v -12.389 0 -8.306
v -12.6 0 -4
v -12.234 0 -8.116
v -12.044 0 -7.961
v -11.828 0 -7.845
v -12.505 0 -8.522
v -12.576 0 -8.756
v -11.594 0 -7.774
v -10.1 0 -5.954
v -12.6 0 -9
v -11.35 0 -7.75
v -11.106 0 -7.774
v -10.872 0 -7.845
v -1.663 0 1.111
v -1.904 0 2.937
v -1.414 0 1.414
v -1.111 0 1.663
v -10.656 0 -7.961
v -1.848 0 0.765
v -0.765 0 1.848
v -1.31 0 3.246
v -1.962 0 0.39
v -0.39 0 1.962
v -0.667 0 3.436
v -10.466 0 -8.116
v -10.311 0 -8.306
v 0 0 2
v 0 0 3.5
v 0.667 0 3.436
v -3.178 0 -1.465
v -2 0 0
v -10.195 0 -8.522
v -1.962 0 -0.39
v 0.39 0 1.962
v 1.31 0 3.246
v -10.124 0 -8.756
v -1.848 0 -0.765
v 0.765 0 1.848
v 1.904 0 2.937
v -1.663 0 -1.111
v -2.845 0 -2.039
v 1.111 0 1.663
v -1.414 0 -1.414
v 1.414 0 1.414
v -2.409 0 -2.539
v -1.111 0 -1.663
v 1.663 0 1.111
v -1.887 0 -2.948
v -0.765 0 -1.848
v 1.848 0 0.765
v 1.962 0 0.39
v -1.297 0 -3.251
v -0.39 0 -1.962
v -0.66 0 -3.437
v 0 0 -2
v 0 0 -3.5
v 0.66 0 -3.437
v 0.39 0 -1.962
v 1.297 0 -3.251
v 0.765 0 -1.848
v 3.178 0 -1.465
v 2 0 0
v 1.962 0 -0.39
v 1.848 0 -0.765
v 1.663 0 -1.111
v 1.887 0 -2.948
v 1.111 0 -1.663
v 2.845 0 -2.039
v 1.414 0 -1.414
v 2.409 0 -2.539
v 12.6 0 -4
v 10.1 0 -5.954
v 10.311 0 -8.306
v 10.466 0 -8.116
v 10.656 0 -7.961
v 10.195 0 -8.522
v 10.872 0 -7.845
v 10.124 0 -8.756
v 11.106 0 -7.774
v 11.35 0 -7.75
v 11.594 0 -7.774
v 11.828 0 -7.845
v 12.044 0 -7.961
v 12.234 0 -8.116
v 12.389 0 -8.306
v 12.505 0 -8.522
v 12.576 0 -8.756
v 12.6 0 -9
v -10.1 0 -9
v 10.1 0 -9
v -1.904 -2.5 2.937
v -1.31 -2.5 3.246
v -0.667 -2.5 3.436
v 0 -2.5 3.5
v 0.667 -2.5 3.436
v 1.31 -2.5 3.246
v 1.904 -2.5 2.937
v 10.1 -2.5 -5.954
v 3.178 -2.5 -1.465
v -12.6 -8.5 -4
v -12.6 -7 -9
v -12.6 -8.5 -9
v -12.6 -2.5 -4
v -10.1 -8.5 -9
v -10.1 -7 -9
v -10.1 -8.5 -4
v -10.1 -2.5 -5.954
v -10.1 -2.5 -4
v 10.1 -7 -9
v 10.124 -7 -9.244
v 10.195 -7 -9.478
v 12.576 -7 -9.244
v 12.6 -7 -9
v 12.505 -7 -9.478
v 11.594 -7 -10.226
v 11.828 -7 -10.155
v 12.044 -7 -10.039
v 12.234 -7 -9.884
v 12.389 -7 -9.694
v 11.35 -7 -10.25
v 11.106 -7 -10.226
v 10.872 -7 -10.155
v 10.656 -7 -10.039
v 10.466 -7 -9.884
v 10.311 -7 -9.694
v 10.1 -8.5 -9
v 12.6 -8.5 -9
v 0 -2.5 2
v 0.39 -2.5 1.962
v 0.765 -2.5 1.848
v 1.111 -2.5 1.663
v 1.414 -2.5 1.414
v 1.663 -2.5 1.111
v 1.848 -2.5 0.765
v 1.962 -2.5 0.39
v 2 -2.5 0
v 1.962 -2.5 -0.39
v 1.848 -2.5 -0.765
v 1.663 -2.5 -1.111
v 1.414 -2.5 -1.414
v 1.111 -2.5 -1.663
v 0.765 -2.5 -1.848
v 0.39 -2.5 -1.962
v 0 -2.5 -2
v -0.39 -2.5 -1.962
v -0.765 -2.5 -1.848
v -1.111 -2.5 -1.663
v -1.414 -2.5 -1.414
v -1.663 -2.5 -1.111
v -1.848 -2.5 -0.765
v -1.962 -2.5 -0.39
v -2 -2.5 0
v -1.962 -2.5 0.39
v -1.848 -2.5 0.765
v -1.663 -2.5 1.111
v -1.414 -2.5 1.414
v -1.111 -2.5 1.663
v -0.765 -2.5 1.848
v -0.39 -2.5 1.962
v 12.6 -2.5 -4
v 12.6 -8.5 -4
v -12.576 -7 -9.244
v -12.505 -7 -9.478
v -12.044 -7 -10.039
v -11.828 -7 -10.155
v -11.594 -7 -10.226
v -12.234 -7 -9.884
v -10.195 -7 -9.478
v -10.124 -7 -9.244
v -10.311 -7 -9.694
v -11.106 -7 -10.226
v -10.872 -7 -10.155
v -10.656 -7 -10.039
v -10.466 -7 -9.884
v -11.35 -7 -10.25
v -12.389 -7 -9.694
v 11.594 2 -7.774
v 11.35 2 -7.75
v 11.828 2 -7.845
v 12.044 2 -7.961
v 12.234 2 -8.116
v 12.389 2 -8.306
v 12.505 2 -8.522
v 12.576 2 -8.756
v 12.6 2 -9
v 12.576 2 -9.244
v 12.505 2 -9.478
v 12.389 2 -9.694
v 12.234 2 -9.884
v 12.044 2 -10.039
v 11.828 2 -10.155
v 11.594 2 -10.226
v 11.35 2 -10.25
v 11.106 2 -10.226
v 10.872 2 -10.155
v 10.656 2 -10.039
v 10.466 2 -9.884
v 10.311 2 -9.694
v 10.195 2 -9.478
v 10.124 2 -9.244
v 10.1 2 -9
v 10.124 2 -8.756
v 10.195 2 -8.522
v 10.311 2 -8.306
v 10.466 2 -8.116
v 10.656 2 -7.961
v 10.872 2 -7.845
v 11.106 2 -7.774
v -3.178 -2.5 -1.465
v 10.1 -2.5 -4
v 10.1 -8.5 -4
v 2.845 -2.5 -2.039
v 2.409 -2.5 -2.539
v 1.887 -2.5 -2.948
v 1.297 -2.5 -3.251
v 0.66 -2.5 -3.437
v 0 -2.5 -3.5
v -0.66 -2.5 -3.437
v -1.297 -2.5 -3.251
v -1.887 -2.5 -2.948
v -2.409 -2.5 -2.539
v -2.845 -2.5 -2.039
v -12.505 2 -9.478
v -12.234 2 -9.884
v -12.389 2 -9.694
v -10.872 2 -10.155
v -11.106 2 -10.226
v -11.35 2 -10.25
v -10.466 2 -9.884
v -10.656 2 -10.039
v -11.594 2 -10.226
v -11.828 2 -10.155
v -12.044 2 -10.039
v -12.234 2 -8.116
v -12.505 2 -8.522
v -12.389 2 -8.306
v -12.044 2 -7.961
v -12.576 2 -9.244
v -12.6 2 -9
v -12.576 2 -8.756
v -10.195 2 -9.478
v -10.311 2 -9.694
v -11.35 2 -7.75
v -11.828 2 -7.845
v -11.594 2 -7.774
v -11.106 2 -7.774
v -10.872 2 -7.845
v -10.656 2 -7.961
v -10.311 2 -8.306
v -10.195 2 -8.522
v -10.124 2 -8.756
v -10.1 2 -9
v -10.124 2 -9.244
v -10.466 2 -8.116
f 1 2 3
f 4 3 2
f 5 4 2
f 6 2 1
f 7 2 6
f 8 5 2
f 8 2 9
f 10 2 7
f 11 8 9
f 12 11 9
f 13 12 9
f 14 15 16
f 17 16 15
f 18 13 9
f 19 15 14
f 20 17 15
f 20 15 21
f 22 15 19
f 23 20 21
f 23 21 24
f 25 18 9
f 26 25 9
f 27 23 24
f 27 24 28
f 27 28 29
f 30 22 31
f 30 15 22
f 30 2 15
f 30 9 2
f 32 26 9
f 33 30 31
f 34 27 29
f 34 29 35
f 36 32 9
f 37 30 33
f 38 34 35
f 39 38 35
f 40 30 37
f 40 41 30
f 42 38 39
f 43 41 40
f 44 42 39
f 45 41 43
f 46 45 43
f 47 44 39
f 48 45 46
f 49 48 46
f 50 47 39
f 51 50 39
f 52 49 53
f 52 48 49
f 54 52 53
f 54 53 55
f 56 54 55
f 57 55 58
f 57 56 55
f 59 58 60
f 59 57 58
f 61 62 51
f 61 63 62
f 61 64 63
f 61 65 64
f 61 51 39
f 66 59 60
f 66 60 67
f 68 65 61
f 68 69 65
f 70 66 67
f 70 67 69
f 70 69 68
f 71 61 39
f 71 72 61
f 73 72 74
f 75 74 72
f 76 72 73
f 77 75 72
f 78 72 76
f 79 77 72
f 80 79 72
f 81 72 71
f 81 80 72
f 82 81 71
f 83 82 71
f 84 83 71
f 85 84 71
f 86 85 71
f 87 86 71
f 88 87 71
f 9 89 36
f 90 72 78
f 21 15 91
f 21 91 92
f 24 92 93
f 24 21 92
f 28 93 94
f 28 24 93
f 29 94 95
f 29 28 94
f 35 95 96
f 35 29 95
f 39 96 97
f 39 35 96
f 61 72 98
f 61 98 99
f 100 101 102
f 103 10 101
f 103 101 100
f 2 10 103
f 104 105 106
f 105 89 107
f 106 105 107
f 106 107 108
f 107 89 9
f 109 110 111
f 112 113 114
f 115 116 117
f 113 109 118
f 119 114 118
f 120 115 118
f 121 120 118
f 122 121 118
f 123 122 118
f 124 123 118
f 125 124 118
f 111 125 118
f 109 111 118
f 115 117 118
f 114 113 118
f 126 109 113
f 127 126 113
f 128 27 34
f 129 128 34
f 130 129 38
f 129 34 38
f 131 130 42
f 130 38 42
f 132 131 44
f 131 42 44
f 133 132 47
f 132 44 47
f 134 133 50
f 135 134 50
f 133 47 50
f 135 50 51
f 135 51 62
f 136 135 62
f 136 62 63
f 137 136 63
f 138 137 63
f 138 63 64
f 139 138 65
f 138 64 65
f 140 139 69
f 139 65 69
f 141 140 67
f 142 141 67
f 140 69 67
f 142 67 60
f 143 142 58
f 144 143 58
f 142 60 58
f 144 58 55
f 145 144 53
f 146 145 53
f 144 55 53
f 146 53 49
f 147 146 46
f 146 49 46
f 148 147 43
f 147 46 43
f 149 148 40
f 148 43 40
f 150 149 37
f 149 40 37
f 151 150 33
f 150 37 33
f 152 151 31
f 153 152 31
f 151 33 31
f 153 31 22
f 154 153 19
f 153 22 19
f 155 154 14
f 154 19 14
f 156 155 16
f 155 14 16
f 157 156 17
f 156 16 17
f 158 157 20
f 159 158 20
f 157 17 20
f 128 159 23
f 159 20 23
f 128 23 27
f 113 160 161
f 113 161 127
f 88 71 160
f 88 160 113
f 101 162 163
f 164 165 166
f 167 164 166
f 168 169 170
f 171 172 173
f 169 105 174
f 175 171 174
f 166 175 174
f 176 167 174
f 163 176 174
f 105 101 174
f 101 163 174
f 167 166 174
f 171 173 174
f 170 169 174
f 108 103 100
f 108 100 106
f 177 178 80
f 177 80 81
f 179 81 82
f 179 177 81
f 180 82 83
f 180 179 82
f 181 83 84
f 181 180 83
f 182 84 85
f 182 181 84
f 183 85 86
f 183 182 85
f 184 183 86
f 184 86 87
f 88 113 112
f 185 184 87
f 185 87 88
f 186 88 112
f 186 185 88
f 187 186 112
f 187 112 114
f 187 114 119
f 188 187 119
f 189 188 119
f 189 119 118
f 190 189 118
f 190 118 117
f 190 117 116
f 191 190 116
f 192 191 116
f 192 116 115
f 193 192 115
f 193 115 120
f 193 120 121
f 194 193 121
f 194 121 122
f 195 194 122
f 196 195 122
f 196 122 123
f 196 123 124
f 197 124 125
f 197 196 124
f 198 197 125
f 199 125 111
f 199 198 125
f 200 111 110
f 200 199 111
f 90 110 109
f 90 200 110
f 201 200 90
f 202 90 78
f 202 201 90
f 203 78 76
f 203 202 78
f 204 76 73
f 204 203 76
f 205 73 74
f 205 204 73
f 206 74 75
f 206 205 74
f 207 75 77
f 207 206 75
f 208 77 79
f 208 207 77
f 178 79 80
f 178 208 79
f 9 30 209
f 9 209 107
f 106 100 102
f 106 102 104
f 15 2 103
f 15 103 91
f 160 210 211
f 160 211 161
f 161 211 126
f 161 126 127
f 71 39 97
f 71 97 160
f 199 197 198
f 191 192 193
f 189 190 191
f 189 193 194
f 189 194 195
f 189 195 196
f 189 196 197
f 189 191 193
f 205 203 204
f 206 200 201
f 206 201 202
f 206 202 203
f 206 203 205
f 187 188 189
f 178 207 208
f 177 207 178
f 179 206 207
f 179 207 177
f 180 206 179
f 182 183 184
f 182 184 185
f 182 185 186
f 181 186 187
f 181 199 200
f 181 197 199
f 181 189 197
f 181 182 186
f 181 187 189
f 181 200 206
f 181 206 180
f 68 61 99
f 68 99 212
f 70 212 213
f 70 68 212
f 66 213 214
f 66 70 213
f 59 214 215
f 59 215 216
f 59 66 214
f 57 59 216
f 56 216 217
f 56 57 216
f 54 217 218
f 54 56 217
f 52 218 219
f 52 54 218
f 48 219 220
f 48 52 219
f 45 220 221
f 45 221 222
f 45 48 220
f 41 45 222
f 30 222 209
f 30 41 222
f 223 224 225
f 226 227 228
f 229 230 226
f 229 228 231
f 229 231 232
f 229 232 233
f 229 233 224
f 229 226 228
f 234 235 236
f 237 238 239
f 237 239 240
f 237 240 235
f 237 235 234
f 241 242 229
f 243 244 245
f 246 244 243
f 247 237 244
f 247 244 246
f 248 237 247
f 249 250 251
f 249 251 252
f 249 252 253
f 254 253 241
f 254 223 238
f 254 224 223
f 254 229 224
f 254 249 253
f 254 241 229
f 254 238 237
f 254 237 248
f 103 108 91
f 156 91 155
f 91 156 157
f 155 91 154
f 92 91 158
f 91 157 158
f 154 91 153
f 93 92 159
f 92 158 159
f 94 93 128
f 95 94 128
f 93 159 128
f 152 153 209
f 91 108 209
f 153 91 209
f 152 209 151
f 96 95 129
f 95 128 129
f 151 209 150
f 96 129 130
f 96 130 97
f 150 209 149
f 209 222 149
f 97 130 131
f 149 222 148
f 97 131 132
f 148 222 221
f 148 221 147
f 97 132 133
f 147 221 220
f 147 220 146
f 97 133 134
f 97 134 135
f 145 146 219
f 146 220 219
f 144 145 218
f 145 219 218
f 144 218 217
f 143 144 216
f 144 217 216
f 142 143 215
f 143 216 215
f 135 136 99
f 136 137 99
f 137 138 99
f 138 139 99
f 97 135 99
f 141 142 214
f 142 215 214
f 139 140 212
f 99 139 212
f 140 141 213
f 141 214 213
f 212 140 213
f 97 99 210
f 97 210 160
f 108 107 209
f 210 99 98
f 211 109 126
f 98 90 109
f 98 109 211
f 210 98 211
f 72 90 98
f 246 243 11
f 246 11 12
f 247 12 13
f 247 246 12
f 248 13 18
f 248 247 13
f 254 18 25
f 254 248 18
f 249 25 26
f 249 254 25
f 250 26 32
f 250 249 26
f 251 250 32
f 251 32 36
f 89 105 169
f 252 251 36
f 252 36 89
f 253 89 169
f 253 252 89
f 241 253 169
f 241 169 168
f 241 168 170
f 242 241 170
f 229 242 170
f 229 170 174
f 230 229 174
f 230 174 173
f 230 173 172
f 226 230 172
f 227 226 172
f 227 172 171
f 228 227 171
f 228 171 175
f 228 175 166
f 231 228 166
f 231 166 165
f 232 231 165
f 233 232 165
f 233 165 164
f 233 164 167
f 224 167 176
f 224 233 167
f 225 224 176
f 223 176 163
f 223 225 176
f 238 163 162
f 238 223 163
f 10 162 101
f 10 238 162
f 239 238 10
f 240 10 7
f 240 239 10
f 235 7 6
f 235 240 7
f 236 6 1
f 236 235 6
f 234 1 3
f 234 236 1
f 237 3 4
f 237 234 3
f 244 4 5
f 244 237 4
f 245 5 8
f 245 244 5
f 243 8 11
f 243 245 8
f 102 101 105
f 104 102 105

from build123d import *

# Parameters (mm, degrees)
ESBO_O1_R                = 2
RESSALTO_EXTRUS_O1_DEPTH = 2.5
RESSALTO_EXTRUS_O2_DEPTH = 7
RESSALTO_EXTRUS_O3_START = 2
ESBO_O1_4_R              = 1.25
RESSALTO_EXTRUS_O3_DEPTH = 2
ESBO_O2_W                = 2.5
ESBO_O2_H                = 5
RESSALTO_EXTRUS_O4_DEPTH = 1.5


with BuildPart() as part:
    # Esboço1 → Ressalto-extrusão1 (new body)
    with BuildSketch(Plane(origin=(0, 0, 0), x_dir=(1, 0, 0), z_dir=(0, 1, 0))):
        with BuildLine():
            ThreePointArc((-10.1, 9), (-11.35, 10.25), (-12.6, 9))
            Line((-12.6, 9), (-12.6, 4))
            Line((-12.6, 4), (-1.904447094, -2.936508346))
            ThreePointArc((-1.904447094, -2.936508346), (0, -3.5), (1.904447094, -2.936508346))
            Line((1.904447094, -2.936508346), (12.6, 4))
            Line((12.6, 4), (12.6, 9))
            ThreePointArc((12.6, 9), (11.35, 10.25), (10.1, 9))
            Line((10.1, 9), (10.1, 5.954321796))
            Line((10.1, 5.954321796), (3.178453386, 1.465412595))
            ThreePointArc((3.178453386, 1.465412595), (0, 3.5), (-3.178453386, 1.465412595))
            Line((-3.178453386, 1.465412595), (-10.1, 5.954321796))
            Line((-10.1, 5.954321796), (-10.1, 9))
        make_face()
        Circle(ESBO_O1_R, mode=Mode.SUBTRACT)
    extrude(amount=-RESSALTO_EXTRUS_O1_DEPTH)

    # Esboço1<3> → Ressalto-extrusão2 (add)
    with BuildSketch(Plane(origin=(0, 0, 0), x_dir=(1, 0, 0), z_dir=(0, 1, 0))):
        with BuildLine():
            ThreePointArc((-10.1, 9), (-11.35, 10.25), (-12.6, 9))
            Line((-12.6, 9), (-12.6, 4))
            Line((-12.6, 4), (-10.1, 4))
            Line((-10.1, 4), (-10.1, 9))
        make_face()
        with BuildLine():
            Line((10.1, 9), (10.1, 4))
            Line((10.1, 4), (12.6, 4))
            Line((12.6, 4), (12.6, 9))
            ThreePointArc((12.6, 9), (11.35, 10.25), (10.1, 9))
        make_face()
    extrude(amount=-RESSALTO_EXTRUS_O2_DEPTH)

    # Esboço1<4> → Ressalto-extrusão3 (add)
    with BuildSketch(Plane(origin=(0, 0, 0), x_dir=(1, 0, 0), z_dir=(0, 1, 0)).offset(RESSALTO_EXTRUS_O3_START)):
        with Locations((-11.35, 9)):
            Circle(ESBO_O1_4_R)
        with Locations((11.35, 9)):
            Circle(ESBO_O1_4_R)
    extrude(amount=-RESSALTO_EXTRUS_O3_DEPTH)

    # Esboço2 → Ressalto-extrusão4 (add)
    with BuildSketch(Plane.XZ.offset(7)):
        with Locations((-11.35, -6.5)):
            Rectangle(ESBO_O2_W, ESBO_O2_H)
        with Locations((11.35, -6.5)):
            Rectangle(ESBO_O2_W, ESBO_O2_H)
    extrude(amount=RESSALTO_EXTRUS_O4_DEPTH)


solid = part.part
